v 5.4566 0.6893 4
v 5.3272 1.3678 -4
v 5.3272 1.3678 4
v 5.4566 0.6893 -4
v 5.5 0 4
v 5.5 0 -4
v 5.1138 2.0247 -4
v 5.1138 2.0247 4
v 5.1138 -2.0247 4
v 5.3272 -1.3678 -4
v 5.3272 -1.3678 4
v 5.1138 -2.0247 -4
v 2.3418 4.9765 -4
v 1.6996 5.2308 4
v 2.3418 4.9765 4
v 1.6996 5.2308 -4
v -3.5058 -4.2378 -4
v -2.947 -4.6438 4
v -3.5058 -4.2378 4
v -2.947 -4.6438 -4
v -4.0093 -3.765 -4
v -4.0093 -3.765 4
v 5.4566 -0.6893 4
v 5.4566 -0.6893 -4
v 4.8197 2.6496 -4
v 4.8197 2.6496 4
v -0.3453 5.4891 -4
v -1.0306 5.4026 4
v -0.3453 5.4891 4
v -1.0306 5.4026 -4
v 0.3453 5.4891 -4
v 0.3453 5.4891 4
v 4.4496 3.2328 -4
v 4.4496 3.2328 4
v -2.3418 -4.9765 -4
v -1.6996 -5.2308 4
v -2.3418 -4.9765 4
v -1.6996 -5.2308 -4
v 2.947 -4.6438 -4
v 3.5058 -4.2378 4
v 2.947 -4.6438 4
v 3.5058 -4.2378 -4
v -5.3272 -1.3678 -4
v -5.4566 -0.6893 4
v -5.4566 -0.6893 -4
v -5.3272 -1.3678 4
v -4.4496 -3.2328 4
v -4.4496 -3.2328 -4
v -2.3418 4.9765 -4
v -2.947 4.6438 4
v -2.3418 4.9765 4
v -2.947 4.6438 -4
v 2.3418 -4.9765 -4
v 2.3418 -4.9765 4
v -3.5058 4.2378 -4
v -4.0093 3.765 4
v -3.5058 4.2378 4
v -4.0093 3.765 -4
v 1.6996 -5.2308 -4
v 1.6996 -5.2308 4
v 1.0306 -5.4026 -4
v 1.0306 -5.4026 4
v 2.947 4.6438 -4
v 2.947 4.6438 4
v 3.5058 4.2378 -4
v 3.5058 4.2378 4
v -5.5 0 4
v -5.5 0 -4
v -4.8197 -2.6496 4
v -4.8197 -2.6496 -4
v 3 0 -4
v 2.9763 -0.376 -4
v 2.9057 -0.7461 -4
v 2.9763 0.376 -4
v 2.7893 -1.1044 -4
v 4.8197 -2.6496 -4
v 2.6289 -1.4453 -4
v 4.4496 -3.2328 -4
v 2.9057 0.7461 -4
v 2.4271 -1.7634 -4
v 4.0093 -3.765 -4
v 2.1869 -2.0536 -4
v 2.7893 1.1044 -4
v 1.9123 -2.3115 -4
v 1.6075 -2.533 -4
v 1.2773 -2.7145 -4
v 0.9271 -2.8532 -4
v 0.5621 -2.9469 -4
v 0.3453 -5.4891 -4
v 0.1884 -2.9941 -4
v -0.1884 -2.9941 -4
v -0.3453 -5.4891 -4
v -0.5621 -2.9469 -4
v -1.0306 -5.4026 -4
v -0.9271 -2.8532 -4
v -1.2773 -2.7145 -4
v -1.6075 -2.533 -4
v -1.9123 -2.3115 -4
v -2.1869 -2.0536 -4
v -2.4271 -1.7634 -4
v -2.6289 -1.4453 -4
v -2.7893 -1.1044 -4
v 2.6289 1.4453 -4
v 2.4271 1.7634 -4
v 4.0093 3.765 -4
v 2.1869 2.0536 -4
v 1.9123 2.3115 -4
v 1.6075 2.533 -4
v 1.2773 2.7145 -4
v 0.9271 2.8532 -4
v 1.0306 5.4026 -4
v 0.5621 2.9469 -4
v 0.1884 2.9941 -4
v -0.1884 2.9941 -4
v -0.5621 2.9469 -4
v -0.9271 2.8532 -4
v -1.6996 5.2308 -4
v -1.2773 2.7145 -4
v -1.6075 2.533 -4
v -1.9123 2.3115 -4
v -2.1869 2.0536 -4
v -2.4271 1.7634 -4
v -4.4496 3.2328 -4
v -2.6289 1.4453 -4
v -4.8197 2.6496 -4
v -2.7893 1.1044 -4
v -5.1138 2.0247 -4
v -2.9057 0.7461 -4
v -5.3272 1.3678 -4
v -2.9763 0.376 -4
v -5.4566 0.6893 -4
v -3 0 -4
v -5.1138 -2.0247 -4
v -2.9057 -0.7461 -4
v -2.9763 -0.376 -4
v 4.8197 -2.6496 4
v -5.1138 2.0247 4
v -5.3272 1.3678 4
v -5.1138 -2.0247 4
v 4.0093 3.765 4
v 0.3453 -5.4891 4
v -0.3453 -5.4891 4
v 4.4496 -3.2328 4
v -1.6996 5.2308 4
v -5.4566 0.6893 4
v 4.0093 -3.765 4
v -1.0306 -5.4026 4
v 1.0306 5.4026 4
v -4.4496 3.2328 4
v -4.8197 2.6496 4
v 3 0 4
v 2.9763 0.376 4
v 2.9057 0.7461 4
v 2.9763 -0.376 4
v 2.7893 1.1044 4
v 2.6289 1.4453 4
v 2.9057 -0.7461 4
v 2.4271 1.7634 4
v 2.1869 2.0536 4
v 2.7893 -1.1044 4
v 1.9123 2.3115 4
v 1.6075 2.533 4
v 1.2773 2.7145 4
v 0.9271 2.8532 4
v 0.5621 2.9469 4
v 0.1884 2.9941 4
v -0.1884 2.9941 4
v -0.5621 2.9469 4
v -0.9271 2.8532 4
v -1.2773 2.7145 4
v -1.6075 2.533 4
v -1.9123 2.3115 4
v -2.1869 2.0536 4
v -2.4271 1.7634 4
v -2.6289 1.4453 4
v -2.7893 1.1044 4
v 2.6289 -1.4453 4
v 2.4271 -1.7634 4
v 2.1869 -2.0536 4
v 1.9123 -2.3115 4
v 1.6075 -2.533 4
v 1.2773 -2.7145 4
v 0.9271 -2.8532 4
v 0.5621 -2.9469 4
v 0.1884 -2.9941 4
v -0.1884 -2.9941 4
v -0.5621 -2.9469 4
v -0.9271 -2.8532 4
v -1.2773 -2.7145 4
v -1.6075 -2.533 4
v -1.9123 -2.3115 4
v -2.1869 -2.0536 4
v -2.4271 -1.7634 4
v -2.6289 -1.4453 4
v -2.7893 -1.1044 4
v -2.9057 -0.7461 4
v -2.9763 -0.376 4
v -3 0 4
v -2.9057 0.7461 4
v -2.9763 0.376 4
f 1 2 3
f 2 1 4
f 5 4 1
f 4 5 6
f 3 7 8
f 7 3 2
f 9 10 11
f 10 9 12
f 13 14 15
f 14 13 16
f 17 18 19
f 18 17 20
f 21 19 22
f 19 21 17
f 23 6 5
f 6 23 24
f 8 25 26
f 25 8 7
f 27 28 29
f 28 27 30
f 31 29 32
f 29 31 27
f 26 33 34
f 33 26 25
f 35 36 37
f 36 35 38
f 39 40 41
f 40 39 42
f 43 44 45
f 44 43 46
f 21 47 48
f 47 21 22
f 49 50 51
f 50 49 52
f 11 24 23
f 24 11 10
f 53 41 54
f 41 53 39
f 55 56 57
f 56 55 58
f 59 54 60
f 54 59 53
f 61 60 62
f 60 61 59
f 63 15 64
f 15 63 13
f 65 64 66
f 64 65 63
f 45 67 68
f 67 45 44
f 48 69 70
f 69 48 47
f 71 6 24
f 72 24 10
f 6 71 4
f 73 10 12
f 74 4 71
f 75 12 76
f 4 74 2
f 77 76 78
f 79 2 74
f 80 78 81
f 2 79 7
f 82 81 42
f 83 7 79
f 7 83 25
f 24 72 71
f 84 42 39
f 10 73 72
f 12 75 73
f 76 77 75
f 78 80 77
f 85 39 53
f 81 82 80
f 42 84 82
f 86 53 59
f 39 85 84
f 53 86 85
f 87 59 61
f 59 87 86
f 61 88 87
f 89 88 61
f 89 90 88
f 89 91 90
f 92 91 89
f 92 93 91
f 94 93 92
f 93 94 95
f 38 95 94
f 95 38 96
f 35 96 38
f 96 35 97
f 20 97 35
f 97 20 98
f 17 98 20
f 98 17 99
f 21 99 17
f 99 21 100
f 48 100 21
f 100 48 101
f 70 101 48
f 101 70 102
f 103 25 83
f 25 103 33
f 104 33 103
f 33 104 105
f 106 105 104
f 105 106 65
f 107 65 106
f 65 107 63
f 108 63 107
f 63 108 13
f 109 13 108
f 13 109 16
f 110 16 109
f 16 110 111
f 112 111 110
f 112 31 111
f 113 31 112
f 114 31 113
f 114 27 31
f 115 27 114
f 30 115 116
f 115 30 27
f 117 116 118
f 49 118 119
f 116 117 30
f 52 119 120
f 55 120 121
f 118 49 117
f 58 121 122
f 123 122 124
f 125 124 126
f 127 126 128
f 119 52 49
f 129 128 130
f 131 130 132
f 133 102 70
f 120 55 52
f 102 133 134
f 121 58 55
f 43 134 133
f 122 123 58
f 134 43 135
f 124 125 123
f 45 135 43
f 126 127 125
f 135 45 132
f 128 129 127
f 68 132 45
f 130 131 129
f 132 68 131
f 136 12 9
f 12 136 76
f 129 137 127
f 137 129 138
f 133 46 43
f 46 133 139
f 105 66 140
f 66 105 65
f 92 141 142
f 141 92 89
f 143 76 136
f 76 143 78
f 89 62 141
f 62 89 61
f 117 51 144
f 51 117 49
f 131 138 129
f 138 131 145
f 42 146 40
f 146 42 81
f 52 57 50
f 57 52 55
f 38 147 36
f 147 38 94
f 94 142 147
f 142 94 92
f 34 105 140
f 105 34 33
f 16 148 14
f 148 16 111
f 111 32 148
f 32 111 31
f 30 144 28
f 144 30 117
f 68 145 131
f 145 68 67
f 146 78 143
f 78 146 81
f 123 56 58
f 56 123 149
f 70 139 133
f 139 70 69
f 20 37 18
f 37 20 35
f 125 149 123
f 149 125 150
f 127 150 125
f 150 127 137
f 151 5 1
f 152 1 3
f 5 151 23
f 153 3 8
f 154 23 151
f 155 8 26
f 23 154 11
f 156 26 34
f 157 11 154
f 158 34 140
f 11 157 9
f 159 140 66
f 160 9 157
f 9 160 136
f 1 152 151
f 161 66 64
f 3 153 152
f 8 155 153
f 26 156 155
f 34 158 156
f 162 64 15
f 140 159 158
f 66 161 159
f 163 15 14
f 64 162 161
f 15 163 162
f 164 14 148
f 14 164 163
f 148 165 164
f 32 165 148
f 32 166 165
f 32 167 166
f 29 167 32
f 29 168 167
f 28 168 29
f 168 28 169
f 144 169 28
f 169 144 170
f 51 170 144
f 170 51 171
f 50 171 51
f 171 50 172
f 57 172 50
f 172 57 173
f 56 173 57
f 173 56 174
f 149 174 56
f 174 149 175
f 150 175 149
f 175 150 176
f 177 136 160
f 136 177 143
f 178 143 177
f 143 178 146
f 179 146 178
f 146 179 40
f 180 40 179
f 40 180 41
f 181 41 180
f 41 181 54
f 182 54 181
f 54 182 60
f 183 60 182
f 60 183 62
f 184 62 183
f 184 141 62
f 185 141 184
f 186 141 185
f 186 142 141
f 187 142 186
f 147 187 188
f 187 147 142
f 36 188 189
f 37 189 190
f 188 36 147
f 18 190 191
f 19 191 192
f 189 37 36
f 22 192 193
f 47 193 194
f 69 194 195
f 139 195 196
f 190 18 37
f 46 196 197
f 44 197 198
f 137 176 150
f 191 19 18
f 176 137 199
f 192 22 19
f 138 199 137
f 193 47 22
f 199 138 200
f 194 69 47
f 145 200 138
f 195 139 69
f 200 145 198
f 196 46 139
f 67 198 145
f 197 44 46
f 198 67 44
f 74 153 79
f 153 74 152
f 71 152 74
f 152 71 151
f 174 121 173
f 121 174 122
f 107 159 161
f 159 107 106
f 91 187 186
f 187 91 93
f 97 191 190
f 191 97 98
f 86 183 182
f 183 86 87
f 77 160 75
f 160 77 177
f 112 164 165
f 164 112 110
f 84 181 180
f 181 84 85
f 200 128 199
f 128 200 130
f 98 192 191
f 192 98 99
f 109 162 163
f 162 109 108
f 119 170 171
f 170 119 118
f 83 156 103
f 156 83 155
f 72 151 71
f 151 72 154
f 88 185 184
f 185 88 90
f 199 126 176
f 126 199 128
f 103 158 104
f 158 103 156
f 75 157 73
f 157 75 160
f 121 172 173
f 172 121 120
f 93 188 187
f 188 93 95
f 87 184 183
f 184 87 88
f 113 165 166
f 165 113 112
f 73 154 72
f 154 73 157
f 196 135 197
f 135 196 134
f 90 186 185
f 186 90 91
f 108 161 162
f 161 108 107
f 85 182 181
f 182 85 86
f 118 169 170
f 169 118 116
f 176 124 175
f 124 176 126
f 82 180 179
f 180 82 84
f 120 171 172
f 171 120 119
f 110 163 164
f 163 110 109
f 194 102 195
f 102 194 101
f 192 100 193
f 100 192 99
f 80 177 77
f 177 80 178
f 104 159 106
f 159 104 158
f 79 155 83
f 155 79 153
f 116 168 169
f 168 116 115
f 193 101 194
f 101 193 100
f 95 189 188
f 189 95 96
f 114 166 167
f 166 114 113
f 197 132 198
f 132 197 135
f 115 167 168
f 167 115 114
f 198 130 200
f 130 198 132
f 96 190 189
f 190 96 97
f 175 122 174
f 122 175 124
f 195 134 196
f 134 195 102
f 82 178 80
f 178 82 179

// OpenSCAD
$fn = 50;


difference() {
	union() {
		translate(v = [0, 0, -4.0000000000]) {
			cylinder(h = 8, r = 5.5000000000);
		}
	}
	union() {
		translate(v = [0, 0, -100.0000000000]) {
			cylinder(h = 200, r = 3.0000000000);
		}
	}
}
